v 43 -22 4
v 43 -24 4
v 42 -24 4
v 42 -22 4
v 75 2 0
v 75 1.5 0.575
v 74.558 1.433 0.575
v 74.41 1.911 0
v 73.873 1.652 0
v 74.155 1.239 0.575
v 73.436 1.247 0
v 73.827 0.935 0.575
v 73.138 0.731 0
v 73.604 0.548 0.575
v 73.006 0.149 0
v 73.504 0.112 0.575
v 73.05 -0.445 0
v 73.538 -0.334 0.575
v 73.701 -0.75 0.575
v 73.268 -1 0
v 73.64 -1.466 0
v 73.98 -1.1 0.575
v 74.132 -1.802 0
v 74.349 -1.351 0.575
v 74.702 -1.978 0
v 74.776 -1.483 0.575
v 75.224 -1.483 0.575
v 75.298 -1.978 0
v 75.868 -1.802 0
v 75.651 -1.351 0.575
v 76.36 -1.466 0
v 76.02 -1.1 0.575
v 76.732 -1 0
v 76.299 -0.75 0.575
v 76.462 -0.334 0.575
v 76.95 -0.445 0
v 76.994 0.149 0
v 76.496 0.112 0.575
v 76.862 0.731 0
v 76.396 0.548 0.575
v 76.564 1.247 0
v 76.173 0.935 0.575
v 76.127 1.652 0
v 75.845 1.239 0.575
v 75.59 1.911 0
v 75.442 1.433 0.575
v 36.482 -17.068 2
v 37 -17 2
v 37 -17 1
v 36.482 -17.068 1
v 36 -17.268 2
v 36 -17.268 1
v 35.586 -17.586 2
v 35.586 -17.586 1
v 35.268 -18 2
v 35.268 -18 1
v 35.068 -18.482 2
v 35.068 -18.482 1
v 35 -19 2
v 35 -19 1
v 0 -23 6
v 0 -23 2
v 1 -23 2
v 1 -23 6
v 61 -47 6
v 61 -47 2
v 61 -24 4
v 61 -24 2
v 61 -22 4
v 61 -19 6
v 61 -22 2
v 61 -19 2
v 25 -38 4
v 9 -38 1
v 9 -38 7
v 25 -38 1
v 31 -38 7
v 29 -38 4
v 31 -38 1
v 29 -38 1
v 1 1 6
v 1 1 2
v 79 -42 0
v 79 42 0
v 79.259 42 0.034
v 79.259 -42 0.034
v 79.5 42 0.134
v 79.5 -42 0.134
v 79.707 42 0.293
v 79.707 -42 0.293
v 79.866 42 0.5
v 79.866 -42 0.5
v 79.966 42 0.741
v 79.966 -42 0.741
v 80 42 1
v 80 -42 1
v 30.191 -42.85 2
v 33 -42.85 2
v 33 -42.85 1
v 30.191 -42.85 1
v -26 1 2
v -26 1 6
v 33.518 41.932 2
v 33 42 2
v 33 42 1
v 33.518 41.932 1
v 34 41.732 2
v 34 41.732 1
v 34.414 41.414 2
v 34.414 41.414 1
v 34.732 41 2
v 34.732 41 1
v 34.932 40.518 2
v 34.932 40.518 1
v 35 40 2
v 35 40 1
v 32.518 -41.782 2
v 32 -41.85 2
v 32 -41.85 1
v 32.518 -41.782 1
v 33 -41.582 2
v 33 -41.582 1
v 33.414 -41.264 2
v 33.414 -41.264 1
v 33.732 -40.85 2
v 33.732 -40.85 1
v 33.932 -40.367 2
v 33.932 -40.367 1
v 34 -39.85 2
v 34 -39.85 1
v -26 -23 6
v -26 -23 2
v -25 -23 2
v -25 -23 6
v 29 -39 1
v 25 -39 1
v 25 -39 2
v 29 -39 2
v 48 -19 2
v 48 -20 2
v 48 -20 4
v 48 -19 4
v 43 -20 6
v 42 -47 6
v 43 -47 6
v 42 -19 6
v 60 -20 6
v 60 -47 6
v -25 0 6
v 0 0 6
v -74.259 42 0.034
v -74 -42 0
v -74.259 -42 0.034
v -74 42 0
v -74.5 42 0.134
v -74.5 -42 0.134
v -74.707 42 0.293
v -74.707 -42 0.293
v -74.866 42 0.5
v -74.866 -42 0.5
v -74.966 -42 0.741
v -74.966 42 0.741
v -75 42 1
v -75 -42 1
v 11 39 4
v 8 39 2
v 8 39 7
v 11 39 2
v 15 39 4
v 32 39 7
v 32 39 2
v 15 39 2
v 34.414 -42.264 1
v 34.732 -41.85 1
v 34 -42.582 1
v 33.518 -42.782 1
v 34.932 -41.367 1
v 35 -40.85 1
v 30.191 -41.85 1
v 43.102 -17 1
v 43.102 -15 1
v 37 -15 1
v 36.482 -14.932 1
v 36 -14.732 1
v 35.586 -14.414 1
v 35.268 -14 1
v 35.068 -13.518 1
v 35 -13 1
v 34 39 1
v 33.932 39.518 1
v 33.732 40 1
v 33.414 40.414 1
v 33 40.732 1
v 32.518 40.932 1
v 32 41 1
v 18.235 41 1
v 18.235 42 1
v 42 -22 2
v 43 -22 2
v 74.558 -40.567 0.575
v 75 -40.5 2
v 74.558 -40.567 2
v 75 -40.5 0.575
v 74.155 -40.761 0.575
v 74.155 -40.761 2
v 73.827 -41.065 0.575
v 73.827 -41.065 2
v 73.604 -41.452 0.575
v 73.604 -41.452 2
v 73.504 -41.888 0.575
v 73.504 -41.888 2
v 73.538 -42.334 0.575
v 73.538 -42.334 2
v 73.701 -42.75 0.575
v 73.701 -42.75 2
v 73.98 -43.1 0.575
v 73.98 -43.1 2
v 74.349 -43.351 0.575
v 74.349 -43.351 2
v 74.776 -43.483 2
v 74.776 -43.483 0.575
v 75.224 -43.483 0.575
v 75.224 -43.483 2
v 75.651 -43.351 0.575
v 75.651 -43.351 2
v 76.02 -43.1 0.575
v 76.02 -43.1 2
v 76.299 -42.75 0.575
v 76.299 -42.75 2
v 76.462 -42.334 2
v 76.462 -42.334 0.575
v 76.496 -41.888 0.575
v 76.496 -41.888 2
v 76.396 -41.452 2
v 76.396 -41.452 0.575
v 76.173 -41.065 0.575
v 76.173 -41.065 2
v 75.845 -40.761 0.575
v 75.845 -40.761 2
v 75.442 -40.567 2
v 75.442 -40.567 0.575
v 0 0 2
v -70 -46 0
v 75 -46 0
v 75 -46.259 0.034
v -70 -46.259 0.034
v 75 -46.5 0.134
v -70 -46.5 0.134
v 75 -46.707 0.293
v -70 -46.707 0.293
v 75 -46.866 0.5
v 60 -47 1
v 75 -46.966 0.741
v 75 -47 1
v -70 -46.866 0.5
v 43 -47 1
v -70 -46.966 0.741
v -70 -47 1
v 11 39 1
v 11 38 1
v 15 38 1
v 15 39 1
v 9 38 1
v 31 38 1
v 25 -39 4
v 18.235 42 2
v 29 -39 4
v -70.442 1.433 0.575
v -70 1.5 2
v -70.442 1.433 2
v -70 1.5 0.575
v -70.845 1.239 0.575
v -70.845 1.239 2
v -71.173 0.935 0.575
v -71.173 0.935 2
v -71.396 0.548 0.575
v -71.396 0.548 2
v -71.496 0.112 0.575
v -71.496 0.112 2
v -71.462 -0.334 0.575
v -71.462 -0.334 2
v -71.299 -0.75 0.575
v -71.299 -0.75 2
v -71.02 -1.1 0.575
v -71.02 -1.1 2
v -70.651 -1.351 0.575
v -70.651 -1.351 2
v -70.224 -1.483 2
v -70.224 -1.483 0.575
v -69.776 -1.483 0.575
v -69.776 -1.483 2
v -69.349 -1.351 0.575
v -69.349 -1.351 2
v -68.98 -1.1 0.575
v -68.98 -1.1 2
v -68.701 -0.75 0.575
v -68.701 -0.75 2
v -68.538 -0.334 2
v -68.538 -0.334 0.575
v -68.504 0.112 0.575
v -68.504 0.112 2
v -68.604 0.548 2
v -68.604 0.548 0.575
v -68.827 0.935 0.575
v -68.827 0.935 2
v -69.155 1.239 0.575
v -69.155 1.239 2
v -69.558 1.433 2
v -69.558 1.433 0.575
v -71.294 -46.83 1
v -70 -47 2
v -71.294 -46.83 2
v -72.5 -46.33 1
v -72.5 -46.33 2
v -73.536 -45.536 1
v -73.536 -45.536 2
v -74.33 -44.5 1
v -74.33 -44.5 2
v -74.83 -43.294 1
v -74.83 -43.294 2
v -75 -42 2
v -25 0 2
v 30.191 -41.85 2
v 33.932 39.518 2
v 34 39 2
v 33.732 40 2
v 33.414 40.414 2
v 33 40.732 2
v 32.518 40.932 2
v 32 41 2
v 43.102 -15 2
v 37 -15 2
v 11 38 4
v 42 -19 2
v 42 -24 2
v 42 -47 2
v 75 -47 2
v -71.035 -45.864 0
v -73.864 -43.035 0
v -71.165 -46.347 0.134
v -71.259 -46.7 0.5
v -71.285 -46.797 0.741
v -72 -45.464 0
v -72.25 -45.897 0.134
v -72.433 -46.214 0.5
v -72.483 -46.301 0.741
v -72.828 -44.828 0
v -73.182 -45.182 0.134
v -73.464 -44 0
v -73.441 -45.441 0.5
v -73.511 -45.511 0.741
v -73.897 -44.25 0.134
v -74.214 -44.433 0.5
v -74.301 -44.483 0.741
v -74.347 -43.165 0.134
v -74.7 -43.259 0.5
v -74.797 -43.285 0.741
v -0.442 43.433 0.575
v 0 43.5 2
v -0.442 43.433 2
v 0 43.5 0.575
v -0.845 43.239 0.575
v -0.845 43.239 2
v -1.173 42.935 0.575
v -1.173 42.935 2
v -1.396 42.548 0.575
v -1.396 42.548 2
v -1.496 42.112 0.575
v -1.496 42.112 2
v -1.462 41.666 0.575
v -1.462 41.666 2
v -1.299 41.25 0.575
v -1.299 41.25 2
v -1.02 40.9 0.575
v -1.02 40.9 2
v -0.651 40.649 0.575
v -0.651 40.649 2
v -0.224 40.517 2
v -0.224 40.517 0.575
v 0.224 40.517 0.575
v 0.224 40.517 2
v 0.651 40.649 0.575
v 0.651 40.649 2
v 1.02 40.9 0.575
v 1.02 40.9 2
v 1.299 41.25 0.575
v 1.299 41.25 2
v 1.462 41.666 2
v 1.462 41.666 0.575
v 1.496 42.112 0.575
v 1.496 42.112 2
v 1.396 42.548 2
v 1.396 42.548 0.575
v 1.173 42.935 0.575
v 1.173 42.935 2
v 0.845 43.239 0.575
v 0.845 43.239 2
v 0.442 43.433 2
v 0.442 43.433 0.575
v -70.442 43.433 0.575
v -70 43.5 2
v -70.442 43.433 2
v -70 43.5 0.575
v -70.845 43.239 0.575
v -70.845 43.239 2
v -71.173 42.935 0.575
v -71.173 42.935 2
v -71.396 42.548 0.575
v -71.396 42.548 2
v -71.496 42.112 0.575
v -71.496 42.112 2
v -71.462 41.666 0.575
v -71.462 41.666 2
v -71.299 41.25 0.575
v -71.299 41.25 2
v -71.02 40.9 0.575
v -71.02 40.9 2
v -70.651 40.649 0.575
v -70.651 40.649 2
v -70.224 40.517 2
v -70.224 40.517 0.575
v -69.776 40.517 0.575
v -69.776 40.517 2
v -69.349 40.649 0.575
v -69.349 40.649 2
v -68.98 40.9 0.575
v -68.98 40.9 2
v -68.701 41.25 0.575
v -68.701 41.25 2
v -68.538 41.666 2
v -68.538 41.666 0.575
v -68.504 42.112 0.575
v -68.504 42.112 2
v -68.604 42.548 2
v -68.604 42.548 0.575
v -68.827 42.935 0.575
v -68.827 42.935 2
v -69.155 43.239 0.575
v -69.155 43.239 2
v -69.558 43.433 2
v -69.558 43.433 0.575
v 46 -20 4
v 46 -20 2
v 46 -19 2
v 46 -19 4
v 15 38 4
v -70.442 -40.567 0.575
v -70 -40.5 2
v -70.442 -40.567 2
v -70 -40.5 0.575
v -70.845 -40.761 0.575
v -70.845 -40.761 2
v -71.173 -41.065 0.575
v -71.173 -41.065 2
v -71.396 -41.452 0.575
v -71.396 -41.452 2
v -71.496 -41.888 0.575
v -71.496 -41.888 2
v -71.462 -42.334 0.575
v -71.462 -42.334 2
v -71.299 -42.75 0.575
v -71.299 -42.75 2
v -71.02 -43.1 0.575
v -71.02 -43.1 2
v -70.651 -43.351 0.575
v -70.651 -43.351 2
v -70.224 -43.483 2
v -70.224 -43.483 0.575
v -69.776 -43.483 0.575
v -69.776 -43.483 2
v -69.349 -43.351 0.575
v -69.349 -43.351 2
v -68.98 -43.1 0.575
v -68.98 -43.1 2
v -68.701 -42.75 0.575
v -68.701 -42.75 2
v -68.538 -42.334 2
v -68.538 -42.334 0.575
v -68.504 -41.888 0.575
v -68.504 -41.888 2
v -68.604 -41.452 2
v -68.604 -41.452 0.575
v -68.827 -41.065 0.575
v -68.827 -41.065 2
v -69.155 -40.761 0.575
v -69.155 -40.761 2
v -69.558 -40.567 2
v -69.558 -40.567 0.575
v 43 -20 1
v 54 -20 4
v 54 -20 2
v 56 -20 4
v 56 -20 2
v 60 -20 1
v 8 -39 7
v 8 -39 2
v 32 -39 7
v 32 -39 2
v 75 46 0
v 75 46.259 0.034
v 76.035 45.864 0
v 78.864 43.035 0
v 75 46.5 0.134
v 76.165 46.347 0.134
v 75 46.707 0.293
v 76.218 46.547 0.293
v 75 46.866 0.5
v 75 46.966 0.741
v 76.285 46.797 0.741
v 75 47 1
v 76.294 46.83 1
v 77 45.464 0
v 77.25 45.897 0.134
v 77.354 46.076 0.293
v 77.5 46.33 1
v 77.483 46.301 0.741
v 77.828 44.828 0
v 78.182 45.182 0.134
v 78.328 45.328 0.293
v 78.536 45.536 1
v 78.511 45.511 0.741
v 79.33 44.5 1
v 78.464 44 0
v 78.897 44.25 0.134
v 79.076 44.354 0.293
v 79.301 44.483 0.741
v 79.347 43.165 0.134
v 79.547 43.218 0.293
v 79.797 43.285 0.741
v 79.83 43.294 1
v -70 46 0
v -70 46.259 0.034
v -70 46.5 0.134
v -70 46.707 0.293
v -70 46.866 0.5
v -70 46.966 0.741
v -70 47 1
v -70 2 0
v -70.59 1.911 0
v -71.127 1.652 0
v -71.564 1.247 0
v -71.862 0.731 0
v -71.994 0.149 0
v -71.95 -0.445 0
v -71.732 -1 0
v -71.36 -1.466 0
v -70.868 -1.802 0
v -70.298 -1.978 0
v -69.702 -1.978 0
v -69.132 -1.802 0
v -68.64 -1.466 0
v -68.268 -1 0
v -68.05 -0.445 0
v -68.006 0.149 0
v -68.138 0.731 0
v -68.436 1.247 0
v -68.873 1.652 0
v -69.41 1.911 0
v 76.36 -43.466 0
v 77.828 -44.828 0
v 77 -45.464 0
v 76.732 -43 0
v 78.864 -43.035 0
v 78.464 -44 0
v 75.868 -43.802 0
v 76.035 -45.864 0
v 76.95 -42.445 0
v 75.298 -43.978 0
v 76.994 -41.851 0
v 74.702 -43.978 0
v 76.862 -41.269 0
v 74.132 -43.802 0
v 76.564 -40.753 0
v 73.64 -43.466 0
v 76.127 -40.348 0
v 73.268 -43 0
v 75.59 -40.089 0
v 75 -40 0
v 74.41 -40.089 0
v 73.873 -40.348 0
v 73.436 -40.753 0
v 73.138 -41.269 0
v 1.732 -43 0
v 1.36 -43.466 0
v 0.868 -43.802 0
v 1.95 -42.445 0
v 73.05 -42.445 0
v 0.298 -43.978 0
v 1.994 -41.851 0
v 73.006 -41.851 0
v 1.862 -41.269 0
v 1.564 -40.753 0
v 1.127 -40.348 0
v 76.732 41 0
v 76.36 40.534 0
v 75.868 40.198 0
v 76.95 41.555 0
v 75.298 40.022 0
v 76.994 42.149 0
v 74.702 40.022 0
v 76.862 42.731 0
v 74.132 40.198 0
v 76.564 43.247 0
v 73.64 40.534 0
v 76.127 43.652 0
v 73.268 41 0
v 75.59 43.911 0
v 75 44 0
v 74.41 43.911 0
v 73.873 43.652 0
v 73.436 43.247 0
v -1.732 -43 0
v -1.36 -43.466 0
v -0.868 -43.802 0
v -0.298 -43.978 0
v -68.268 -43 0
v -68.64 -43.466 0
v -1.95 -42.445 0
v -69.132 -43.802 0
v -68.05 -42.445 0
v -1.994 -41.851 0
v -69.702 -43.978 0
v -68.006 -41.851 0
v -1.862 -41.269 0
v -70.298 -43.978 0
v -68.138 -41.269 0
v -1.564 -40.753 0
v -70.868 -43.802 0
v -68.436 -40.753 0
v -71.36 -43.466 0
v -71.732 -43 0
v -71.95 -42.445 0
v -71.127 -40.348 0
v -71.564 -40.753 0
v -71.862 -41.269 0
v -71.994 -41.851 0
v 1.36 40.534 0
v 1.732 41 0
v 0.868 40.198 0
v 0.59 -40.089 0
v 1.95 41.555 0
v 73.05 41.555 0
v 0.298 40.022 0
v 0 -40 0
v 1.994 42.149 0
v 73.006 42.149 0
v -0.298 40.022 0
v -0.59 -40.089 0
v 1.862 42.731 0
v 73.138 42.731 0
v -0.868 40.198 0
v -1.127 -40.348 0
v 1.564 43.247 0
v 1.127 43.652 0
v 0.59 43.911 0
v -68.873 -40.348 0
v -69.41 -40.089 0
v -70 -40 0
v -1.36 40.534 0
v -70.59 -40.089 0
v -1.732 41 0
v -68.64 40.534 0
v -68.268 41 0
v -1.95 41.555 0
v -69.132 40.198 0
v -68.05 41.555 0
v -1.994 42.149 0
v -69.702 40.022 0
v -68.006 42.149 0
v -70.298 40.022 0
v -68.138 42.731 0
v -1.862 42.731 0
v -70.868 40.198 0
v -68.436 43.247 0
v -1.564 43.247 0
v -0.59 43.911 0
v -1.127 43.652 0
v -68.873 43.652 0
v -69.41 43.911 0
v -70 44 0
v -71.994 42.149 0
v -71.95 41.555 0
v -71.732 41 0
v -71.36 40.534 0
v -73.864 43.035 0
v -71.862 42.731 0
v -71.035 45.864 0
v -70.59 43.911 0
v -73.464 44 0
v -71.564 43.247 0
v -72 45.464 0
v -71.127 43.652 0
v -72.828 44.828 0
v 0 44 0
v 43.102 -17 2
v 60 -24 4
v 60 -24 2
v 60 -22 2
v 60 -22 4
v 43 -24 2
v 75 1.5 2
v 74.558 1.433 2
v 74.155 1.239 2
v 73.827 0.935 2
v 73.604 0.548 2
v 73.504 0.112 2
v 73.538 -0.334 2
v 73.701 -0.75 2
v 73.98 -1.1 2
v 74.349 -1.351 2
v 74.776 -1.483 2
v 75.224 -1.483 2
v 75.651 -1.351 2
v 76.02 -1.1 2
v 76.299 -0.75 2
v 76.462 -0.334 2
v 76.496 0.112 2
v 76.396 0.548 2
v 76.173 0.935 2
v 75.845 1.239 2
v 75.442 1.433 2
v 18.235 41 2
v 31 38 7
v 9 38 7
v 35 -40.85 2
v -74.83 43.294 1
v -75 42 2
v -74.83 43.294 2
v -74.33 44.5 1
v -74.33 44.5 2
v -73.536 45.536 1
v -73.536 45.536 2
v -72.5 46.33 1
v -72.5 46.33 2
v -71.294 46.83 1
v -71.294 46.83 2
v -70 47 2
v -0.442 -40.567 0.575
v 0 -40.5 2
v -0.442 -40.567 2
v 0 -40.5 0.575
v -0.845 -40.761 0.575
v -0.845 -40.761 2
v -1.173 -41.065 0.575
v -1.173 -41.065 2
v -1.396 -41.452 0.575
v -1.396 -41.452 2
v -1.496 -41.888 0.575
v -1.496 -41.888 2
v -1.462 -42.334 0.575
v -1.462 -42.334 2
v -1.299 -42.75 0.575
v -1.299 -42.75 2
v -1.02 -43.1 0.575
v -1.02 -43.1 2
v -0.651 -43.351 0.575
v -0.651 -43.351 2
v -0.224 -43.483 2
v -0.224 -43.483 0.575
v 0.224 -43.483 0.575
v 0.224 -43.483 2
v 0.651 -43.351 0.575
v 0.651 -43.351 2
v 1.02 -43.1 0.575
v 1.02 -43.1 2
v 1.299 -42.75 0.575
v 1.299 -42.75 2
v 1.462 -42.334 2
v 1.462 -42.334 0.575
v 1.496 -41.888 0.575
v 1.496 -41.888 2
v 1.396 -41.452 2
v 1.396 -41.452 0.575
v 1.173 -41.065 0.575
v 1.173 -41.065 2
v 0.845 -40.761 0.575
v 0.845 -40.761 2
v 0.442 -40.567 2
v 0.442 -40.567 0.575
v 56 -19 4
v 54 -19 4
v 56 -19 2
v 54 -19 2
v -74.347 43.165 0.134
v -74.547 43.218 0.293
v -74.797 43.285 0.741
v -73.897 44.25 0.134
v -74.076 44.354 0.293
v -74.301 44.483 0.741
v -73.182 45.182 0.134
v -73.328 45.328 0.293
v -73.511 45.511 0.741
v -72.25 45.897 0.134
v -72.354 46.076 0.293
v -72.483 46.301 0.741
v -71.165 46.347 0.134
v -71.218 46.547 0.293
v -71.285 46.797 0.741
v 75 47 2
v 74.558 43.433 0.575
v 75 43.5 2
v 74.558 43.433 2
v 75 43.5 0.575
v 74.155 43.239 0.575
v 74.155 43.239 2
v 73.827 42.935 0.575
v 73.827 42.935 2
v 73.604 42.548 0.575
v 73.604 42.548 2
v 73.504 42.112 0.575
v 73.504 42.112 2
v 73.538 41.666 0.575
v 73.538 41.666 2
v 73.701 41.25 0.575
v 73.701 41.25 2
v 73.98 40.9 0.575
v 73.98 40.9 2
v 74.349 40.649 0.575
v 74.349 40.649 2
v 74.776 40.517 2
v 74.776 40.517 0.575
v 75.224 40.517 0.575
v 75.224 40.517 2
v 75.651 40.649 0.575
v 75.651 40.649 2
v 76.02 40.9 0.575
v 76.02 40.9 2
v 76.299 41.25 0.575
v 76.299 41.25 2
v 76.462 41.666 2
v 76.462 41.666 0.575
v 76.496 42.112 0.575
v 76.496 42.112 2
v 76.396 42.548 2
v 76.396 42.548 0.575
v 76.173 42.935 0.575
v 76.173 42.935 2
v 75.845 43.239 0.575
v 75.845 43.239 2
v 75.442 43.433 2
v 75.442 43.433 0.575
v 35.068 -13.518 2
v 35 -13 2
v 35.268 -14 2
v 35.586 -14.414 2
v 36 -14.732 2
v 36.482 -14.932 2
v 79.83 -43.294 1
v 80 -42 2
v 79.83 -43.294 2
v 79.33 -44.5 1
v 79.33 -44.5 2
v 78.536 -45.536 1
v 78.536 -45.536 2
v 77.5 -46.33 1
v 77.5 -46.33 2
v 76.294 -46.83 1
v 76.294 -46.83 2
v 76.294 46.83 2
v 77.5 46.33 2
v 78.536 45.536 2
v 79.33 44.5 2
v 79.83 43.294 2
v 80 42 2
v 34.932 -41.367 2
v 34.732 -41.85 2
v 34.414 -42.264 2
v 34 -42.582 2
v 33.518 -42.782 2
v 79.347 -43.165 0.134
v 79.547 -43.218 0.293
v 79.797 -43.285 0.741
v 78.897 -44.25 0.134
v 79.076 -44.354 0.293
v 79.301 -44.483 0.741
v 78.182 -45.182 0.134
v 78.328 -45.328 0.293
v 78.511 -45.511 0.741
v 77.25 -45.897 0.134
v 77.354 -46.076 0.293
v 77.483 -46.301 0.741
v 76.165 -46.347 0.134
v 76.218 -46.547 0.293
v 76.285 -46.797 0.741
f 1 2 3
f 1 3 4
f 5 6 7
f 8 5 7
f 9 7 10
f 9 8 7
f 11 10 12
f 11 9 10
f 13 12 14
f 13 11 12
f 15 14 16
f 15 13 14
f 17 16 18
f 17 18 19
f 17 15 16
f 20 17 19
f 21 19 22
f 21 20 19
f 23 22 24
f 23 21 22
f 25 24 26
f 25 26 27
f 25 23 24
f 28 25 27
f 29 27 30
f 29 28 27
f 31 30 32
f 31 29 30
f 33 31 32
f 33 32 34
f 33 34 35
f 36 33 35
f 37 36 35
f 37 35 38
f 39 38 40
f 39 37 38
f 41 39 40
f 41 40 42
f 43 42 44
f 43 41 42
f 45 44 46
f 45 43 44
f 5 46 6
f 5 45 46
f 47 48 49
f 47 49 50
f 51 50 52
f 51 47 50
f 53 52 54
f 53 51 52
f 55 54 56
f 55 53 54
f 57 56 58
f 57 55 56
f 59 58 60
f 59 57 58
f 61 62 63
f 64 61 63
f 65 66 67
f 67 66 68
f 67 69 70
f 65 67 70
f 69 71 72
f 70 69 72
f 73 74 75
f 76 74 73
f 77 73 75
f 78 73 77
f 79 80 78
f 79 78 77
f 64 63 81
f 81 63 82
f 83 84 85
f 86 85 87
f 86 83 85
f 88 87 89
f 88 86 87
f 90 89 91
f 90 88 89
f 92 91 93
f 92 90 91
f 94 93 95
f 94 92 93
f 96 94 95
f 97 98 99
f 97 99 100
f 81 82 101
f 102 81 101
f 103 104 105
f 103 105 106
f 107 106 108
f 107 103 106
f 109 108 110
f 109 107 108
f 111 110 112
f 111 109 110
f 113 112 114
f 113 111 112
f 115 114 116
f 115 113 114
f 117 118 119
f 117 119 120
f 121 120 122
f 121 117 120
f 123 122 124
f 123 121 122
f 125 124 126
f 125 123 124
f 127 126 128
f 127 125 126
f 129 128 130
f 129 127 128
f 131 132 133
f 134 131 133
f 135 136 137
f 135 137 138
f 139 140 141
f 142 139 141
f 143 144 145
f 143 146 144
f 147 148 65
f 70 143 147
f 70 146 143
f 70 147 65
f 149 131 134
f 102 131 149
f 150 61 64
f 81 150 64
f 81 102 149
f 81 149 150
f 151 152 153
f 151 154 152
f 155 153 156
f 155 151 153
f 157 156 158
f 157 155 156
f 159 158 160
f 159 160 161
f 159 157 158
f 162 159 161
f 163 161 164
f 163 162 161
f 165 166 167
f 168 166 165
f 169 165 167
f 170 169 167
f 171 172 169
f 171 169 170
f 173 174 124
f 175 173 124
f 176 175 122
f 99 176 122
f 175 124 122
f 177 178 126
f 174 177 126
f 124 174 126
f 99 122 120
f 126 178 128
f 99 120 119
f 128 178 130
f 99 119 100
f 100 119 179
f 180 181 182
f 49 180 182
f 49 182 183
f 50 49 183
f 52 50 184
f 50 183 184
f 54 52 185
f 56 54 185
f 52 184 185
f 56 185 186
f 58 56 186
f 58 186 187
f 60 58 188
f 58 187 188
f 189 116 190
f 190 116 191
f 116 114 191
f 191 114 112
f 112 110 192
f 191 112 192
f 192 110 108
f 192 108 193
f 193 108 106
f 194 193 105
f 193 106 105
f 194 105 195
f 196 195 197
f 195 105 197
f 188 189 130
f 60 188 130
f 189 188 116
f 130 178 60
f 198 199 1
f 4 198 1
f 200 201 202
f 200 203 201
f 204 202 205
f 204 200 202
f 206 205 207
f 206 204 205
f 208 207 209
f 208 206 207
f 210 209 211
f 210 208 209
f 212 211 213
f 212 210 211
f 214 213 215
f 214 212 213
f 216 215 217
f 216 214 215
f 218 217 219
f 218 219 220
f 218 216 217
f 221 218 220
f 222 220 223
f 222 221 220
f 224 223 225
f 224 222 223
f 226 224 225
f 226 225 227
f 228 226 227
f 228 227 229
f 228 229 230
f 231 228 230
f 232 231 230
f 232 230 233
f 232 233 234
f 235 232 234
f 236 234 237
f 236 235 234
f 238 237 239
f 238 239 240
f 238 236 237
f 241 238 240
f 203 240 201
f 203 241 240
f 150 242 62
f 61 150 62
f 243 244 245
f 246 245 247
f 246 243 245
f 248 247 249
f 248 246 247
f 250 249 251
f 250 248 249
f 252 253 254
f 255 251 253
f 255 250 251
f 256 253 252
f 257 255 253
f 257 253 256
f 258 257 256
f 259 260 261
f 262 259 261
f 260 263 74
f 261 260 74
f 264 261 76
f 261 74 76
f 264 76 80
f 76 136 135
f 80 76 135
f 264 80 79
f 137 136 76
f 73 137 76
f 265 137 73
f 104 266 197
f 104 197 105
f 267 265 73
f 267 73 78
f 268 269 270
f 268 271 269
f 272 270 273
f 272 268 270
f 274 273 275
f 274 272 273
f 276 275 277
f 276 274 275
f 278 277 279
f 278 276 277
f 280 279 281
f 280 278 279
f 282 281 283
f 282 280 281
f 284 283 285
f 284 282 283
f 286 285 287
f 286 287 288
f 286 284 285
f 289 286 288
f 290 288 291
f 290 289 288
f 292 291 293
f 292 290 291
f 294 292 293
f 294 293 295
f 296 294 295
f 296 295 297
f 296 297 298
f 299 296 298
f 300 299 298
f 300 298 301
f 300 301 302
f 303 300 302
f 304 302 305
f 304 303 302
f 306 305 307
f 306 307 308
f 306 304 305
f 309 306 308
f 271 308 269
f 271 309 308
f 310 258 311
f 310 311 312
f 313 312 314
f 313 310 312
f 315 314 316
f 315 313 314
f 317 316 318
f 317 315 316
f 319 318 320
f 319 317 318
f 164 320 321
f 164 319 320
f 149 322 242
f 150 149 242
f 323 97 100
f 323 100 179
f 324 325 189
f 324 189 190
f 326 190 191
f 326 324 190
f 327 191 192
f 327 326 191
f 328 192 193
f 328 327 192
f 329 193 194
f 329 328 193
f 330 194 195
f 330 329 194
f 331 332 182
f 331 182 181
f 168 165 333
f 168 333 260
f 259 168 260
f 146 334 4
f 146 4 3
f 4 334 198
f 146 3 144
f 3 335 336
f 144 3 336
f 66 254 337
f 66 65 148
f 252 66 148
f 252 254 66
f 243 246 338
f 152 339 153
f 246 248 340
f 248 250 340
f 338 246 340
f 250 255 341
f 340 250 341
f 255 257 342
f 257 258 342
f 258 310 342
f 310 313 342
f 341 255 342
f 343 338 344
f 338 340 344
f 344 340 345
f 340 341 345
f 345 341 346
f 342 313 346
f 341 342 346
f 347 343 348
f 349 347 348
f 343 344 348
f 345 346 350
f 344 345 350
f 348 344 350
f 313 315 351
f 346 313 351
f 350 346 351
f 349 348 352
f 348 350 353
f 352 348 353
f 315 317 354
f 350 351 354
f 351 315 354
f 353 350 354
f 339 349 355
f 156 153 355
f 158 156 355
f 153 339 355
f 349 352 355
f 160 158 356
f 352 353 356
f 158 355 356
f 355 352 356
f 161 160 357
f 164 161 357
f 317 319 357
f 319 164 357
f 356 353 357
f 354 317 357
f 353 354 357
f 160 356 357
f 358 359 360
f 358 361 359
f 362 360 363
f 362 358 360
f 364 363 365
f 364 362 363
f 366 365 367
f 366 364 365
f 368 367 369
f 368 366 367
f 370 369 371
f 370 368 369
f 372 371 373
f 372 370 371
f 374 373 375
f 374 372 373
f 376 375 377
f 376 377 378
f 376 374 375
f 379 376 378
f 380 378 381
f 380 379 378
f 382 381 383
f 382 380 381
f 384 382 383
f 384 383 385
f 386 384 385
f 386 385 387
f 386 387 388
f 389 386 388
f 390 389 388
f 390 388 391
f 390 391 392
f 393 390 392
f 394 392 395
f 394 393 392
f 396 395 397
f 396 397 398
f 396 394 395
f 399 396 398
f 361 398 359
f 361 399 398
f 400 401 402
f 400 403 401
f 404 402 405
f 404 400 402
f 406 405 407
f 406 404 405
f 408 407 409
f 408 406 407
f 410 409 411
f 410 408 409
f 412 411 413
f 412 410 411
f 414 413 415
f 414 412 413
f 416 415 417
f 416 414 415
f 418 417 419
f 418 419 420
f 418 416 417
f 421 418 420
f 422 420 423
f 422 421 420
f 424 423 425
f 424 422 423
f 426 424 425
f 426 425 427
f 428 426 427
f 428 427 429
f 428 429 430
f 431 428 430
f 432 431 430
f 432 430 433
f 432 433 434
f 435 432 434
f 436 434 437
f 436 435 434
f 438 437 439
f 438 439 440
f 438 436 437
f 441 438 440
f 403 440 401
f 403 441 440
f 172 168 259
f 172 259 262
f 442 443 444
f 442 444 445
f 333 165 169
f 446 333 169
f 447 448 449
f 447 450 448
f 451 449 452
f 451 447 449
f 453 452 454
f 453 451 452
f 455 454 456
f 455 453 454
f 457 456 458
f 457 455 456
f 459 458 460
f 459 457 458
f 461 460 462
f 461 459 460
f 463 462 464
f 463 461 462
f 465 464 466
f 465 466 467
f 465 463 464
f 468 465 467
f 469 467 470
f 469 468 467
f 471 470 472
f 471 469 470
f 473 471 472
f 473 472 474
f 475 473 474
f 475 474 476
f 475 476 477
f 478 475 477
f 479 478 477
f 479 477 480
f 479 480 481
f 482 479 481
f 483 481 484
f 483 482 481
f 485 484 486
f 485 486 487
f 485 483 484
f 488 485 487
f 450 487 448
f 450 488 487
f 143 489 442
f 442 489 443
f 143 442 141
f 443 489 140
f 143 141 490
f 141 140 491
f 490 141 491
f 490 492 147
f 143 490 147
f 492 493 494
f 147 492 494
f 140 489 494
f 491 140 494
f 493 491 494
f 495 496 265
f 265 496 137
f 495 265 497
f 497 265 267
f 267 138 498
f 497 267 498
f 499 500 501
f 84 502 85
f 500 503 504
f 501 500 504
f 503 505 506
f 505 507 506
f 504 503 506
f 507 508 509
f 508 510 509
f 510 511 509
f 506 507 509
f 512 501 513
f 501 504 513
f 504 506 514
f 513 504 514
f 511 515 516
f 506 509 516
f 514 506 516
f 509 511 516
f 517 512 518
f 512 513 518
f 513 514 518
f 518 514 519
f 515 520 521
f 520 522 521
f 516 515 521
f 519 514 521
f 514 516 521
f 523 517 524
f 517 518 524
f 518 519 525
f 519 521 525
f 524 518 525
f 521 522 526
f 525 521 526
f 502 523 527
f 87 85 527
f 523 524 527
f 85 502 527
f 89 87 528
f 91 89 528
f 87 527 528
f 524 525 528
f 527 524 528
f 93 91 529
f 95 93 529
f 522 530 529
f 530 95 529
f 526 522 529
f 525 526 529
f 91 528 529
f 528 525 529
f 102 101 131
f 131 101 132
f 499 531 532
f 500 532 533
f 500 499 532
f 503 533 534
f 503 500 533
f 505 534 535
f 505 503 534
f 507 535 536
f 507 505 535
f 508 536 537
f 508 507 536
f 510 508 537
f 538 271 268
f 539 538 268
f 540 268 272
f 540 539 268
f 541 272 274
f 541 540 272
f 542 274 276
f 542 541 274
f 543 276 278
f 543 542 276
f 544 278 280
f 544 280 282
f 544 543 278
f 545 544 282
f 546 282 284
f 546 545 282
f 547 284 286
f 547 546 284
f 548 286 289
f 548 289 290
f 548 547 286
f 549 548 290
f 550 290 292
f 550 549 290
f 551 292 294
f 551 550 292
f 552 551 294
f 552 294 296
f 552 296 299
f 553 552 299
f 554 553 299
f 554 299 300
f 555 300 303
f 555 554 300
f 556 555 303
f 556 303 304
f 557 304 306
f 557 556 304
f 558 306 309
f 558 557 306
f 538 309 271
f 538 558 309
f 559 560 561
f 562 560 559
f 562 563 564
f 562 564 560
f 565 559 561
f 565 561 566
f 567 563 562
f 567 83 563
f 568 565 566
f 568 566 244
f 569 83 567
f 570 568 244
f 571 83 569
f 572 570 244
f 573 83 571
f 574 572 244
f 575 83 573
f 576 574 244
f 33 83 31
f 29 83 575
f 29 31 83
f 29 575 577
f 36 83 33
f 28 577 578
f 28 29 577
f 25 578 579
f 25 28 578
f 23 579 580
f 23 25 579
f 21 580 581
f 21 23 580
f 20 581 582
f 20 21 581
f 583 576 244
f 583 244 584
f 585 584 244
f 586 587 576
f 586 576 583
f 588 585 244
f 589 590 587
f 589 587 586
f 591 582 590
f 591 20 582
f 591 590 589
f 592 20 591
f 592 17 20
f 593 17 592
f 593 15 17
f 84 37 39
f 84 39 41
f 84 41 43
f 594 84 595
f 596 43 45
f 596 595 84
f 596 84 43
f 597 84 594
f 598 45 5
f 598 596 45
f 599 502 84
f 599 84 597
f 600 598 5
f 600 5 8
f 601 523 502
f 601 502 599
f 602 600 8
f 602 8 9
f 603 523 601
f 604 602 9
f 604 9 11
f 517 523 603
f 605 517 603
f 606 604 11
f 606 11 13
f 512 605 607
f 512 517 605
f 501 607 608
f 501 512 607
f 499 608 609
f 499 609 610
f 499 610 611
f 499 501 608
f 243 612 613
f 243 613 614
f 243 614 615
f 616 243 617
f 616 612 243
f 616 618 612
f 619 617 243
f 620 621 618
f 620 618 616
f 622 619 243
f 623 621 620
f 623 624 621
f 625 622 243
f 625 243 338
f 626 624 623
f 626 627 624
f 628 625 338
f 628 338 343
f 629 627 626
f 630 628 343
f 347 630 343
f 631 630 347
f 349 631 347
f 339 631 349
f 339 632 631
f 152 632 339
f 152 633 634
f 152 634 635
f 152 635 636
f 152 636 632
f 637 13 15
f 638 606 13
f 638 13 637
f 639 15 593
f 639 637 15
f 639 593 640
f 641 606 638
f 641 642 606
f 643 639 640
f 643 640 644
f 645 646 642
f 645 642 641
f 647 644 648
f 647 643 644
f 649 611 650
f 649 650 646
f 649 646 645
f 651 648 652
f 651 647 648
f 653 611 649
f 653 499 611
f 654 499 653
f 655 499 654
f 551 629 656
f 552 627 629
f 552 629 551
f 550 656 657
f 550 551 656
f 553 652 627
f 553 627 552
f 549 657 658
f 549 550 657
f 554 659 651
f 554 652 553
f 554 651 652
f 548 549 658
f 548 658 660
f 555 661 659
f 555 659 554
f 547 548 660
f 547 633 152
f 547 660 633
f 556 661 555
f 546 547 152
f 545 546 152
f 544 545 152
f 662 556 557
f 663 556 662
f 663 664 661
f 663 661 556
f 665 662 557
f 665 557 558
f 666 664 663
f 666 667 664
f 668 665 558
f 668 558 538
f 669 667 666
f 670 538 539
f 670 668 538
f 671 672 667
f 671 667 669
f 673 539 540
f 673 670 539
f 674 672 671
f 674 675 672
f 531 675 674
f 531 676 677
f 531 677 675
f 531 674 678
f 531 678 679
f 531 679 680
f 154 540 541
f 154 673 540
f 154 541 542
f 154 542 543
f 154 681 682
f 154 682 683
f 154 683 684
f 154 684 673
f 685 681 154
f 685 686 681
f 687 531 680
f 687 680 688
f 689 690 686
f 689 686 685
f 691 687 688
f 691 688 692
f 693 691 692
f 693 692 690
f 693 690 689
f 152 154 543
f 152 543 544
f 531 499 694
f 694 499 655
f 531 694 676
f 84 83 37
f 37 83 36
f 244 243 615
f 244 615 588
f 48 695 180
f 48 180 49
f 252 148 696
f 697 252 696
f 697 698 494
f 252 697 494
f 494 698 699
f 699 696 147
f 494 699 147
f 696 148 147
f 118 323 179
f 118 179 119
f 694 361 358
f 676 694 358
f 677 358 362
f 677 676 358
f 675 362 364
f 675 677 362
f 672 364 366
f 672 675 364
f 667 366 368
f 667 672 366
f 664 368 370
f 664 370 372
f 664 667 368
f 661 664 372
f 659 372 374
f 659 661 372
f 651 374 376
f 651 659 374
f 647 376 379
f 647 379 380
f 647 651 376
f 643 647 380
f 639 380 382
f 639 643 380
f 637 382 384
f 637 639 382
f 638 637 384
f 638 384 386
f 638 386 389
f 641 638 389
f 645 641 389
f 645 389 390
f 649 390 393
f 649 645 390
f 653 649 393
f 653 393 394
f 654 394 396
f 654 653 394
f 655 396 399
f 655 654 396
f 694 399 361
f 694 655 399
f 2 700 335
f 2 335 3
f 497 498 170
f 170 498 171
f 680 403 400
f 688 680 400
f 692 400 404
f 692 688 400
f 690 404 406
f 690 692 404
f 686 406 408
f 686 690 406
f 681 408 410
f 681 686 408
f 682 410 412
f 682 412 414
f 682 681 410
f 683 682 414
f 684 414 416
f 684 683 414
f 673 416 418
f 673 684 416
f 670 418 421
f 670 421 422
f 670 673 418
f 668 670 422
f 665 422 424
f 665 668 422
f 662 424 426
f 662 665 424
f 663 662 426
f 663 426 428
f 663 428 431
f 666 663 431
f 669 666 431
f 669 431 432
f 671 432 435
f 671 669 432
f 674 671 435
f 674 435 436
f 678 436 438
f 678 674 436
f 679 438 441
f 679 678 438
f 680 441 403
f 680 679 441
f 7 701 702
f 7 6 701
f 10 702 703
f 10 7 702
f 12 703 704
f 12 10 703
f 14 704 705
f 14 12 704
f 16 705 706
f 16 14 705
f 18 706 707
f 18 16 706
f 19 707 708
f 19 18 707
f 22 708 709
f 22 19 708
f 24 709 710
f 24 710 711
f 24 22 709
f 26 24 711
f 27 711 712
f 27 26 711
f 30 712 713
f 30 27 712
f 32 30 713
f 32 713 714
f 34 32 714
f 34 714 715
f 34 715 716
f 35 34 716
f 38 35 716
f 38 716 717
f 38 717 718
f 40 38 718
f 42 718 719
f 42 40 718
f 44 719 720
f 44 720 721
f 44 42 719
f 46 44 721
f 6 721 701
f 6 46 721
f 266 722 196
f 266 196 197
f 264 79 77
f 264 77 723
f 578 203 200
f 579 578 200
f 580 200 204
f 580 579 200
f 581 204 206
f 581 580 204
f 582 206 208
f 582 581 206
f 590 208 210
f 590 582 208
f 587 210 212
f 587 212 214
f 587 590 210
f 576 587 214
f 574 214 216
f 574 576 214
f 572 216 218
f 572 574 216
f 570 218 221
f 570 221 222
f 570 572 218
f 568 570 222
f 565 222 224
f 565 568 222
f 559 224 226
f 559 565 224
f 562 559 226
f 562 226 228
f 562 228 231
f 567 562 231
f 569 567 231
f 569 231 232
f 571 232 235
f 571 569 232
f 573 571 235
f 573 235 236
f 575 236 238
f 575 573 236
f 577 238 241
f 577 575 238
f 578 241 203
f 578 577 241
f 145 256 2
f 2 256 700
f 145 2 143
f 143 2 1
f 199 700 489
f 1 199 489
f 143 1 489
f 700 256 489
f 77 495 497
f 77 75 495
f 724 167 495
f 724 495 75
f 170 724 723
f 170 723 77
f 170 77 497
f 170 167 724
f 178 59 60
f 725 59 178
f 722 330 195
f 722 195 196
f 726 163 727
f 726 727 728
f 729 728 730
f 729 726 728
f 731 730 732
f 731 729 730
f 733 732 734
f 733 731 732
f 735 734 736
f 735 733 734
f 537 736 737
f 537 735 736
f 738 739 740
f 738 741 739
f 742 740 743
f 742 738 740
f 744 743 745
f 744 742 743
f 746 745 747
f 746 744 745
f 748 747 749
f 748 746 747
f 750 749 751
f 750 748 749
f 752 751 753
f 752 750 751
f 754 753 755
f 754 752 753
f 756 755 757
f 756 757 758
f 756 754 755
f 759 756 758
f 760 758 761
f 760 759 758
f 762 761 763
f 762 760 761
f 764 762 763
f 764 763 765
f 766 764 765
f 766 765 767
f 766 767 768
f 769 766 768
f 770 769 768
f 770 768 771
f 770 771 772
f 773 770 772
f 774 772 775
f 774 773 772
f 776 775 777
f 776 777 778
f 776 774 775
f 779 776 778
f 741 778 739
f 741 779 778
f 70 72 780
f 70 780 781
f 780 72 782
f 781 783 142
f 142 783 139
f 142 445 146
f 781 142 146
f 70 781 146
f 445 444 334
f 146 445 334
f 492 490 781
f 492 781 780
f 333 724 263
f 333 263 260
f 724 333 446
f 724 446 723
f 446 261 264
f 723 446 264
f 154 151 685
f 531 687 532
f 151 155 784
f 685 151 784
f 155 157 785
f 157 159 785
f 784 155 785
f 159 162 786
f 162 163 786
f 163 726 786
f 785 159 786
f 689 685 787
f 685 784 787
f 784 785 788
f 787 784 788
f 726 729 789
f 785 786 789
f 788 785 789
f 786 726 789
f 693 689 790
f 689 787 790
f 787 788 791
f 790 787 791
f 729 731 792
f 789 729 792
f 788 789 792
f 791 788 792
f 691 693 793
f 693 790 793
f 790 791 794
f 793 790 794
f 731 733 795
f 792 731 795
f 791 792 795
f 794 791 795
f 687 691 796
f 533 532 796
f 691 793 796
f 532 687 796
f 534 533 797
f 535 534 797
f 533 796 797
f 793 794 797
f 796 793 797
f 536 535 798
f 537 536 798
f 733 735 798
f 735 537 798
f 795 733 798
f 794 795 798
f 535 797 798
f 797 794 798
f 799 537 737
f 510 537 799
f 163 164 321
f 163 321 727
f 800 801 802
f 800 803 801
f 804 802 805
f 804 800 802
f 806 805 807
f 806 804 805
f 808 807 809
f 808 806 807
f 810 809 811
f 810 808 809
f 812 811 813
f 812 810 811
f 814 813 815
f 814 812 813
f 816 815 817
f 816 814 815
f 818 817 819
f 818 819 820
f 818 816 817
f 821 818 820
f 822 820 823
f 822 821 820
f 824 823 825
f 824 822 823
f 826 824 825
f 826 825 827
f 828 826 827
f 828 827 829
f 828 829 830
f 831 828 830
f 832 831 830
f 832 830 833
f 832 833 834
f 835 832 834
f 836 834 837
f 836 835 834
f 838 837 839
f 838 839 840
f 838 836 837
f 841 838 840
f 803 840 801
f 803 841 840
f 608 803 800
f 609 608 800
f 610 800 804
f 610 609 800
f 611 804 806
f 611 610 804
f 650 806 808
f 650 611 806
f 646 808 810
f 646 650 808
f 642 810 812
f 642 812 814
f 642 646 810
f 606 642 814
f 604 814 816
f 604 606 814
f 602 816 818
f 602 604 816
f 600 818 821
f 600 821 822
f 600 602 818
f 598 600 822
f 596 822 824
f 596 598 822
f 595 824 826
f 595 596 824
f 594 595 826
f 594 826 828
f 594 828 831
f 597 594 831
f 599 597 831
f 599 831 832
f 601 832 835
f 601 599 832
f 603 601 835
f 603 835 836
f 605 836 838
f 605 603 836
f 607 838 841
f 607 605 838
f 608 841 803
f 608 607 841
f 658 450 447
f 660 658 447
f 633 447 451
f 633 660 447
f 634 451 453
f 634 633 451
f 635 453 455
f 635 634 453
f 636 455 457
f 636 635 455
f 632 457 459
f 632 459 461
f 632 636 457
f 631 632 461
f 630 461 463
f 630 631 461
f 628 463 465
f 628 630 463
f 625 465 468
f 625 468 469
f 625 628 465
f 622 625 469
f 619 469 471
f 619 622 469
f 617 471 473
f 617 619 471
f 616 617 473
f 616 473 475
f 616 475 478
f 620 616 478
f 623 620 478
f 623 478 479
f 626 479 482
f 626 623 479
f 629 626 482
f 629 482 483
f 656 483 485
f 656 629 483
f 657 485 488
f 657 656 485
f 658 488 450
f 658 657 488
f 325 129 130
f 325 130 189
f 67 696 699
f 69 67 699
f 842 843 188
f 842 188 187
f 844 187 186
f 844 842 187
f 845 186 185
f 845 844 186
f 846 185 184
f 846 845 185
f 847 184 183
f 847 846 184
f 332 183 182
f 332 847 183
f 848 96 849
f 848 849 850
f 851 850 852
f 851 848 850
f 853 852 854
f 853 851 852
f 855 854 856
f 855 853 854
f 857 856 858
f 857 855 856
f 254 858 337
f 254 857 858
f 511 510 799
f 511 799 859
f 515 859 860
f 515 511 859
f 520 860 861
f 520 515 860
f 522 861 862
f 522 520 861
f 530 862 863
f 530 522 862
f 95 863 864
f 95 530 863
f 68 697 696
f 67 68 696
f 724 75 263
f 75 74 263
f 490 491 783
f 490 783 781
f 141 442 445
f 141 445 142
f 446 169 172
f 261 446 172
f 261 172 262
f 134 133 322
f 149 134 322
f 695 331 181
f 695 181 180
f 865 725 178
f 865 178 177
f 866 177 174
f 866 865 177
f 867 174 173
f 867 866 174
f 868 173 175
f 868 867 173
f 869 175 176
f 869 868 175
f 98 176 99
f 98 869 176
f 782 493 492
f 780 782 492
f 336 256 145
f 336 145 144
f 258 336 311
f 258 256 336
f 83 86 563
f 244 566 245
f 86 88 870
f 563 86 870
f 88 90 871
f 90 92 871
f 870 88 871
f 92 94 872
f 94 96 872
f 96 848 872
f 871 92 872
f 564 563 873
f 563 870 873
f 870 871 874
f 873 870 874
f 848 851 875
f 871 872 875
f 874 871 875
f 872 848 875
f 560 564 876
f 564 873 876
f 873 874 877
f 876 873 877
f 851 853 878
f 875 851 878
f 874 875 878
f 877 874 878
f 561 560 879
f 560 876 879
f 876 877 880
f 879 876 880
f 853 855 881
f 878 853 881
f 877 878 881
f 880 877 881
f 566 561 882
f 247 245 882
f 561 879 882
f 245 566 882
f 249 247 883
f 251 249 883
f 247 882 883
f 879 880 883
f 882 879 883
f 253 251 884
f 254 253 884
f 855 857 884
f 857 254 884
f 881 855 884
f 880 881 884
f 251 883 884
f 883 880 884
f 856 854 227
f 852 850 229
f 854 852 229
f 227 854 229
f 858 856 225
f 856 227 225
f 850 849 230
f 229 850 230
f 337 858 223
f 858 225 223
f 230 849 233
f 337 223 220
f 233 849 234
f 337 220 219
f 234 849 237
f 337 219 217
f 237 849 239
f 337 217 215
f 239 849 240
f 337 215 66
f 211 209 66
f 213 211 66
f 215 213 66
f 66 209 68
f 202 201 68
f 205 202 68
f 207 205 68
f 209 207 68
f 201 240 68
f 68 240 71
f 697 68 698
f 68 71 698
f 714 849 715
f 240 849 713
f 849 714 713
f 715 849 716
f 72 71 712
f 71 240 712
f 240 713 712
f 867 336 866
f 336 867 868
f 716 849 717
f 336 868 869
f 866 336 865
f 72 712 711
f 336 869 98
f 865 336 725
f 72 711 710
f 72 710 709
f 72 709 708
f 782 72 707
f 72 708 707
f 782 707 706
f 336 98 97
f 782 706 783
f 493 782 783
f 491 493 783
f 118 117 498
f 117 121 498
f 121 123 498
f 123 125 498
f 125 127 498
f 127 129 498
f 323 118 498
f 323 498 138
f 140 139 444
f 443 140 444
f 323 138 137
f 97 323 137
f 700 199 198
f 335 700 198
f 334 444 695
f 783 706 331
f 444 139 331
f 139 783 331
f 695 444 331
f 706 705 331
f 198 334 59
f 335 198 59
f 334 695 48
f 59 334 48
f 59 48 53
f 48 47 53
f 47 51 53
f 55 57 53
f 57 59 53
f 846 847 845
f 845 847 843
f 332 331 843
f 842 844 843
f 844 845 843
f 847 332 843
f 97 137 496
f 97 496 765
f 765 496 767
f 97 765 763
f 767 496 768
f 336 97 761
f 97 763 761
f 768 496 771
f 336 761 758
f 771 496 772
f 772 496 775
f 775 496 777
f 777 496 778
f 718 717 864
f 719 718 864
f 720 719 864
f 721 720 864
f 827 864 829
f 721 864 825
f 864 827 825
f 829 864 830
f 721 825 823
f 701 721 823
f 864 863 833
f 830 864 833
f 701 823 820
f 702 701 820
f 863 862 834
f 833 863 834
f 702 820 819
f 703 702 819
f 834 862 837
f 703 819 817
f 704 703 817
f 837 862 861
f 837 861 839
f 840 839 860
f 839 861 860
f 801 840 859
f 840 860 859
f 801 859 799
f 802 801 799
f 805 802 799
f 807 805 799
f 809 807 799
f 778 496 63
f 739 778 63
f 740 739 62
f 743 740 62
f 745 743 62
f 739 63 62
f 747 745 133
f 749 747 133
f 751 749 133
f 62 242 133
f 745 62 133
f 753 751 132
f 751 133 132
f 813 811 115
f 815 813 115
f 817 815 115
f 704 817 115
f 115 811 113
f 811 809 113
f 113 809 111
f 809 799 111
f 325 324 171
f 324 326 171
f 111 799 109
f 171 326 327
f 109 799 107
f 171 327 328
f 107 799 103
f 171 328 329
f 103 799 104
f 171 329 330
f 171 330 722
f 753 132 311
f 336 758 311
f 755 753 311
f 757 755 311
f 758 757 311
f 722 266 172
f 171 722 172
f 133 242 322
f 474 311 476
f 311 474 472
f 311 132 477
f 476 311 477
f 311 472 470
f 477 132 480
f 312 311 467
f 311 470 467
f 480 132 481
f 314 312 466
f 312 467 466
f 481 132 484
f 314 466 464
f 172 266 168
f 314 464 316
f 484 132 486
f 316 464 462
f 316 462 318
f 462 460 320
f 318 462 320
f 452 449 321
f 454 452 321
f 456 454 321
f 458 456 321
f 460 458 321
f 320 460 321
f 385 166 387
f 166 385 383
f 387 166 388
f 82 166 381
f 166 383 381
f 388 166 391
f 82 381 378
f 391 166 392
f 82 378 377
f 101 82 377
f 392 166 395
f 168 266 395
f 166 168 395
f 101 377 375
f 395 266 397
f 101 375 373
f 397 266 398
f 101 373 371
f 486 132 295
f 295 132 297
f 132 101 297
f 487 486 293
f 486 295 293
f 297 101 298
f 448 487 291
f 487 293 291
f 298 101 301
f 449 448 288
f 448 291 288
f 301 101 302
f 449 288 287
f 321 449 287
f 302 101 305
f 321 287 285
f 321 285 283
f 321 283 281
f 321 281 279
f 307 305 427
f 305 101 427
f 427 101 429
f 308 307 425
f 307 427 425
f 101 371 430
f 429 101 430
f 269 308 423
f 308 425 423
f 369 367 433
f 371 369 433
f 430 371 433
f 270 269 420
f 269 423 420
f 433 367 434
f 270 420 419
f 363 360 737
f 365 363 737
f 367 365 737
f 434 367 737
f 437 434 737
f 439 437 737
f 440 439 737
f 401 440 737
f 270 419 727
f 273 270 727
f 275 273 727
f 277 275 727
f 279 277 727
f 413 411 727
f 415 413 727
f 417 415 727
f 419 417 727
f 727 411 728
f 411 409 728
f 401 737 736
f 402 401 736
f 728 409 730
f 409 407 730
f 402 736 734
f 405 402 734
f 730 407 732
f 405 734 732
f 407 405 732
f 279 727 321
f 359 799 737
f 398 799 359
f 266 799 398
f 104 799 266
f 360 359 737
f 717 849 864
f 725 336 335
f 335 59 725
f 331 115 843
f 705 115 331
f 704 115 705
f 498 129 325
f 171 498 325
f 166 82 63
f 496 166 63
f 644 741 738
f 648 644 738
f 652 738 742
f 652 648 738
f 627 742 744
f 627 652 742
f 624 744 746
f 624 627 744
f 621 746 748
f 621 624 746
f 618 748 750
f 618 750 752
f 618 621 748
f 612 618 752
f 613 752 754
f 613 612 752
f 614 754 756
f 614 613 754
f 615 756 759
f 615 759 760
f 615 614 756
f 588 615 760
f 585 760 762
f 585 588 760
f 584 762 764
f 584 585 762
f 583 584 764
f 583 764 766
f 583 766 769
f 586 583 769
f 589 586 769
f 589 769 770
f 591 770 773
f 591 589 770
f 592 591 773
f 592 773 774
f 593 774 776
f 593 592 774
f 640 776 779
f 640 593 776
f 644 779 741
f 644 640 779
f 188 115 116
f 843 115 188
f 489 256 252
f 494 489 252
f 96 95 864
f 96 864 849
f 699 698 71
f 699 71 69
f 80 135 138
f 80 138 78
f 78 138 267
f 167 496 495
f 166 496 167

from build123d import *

# Parameters (mm, degrees)
BOSS_EXTRUDE1_DEPTH                           = 2
CSK_FOR_0_FLAT_HEAD_MACHINE_SCREW1_AT_2_COUNT = 2
CSK_FOR_0_FLAT_HEAD_MACHINE_SCREW1_AT_2_PITCH = 42
CSK_FOR_0_FLAT_HEAD_MACHINE_SCREW1_AT_3_COUNT = 2
CSK_FOR_0_FLAT_HEAD_MACHINE_SCREW1_AT_3_PITCH = 84
CSK_FOR_0_FLAT_HEAD_MACHINE_SCREW1_AT_4_COUNT = 2
CSK_FOR_0_FLAT_HEAD_MACHINE_SCREW1_AT_4_PITCH = 112.609946275
CSK_FOR_0_FLAT_HEAD_MACHINE_SCREW1_AT_5_COUNT = 2
CSK_FOR_0_FLAT_HEAD_MACHINE_SCREW1_AT_5_PITCH = 167.573864311
CSK_FOR_0_FLAT_HEAD_MACHINE_SCREW1_AT_6_COUNT = 2
CSK_FOR_0_FLAT_HEAD_MACHINE_SCREW1_AT_6_PITCH = 150.960259671
CSK_FOR_0_FLAT_HEAD_MACHINE_SCREW1_AT_7_COUNT = 2
CSK_FOR_0_FLAT_HEAD_MACHINE_SCREW1_AT_7_PITCH = 145
CSK_FOR_0_FLAT_HEAD_MACHINE_SCREW1_AT_8_COUNT = 2
CSK_FOR_0_FLAT_HEAD_MACHINE_SCREW1_AT_8_PITCH = 75
FILLET1_R                                     = 1
SKETCH9_W                                     = 22
SKETCH9_H                                     = 76
CUT_EXTRUDE2_DEPTH                            = 1
SKETCH9_5_W                                   = 24
SKETCH9_5_H                                   = 78
SKETCH9_5_W_2                                 = 22
SKETCH9_5_H_2                                 = 76
BOSS_EXTRUDE4_DEPTH                           = 5
SKETCH11_W                                    = 4
SKETCH11_H                                    = 2
CUT_EXTRUDE4_DEPTH                            = 5
SKETCH13_W                                    = 4
SKETCH13_H                                    = 2
CUT_EXTRUDE5_DEPTH                            = 1
SKETCH14_W                                    = 4
SKETCH14_H                                    = 1
CUT_EXTRUDE6_DEPTH                            = 1
SKETCH15_W                                    = 4
SKETCH15_H                                    = 1
CUT_EXTRUDE7_DEPTH                            = 1
BOSS_EXTRUDE5_DEPTH                           = 4
SKETCH9_8_W                                   = 17
SKETCH9_8_H                                   = 27
CUT_EXTRUDE10_DEPTH                           = 1
SKETCH17_W                                    = 2
SKETCH17_H                                    = 2
CUT_EXTRUDE11_DEPTH                           = 1
CUT_EXTRUDE12_DEPTH                           = 21
CUT_EXTRUDE12_DEPTH_BACK                      = 1
SKETCH18_W                                    = 2
SKETCH18_H                                    = 2
CUT_EXTRUDE13_DEPTH                           = 1
BOSS_EXTRUDE6_DEPTH                           = 4


with BuildPart() as part:
    # Sketch1 → Boss-Extrude1 (new body)
    with BuildSketch(Plane.XY):
        with BuildLine():
            Line((-70, 47), (75, 47))
            ThreePointArc((75, 47), (78.535533906, 45.535533906), (80, 42))
            Line((80, 42), (80, -42))
            ThreePointArc((80, -42), (78.535533906, -45.535533906), (75, -47))
            Line((75, -47), (-70, -47))
            ThreePointArc((-70, -47), (-73.535533906, -45.535533906), (-75, -42))
            Line((-75, -42), (-75, 42))
            ThreePointArc((-75, 42), (-73.535533906, 45.535533906), (-70, 47))
        make_face()
    extrude(amount=BOSS_EXTRUDE1_DEPTH)

    # Sketch8 → CSK for #0 Flat Head Machine Screw1 (revolve, cut)
    with BuildSketch(Plane(origin=(75, 42, 0), x_dir=(0, 1, 0), z_dir=(1, 0, 0))):
        Polygon((0, 0), (0, 2), (1.500000048, 2), (1.500000048, 0.575184076), (1.999999937, 0), align=None)
    csk_for_0_flat_head_machine_screw1 = revolve(axis=Axis((75, 42, -6.35), (0, 0, 1)), mode=Mode.SUBTRACT)

    # CSK for #0 Flat Head Machine Screw1 at 2: CSK for #0 Flat Head Machine Screw1 ×2
    with Locations(*[(0, -i * CSK_FOR_0_FLAT_HEAD_MACHINE_SCREW1_AT_2_PITCH, 0) for i in range(1, CSK_FOR_0_FLAT_HEAD_MACHINE_SCREW1_AT_2_COUNT)]):
        add(csk_for_0_flat_head_machine_screw1, mode=Mode.SUBTRACT)

    # CSK for #0 Flat Head Machine Screw1 at 3: CSK for #0 Flat Head Machine Screw1 ×2
    with Locations(*[(0, -i * CSK_FOR_0_FLAT_HEAD_MACHINE_SCREW1_AT_3_PITCH, 0) for i in range(1, CSK_FOR_0_FLAT_HEAD_MACHINE_SCREW1_AT_3_COUNT)]):
        add(csk_for_0_flat_head_machine_screw1, mode=Mode.SUBTRACT)

    # CSK for #0 Flat Head Machine Screw1 at 4: CSK for #0 Flat Head Machine Screw1 ×2
    with Locations(*[Vector(-0.6660157693088523, -0.7459376616259147, 0) * (i * CSK_FOR_0_FLAT_HEAD_MACHINE_SCREW1_AT_4_PITCH) for i in range(1, CSK_FOR_0_FLAT_HEAD_MACHINE_SCREW1_AT_4_COUNT)]):
        add(csk_for_0_flat_head_machine_screw1, mode=Mode.SUBTRACT)

    # CSK for #0 Flat Head Machine Screw1 at 5: CSK for #0 Flat Head Machine Screw1 ×2
    with Locations(*[Vector(-0.8652900653481878, -0.5012714861327433, 0) * (i * CSK_FOR_0_FLAT_HEAD_MACHINE_SCREW1_AT_5_PITCH) for i in range(1, CSK_FOR_0_FLAT_HEAD_MACHINE_SCREW1_AT_5_COUNT)]):
        add(csk_for_0_flat_head_machine_screw1, mode=Mode.SUBTRACT)

    # CSK for #0 Flat Head Machine Screw1 at 6: CSK for #0 Flat Head Machine Screw1 ×2
    with Locations(*[Vector(-0.9605176906545201, -0.27821891729303344, 0) * (i * CSK_FOR_0_FLAT_HEAD_MACHINE_SCREW1_AT_6_PITCH) for i in range(1, CSK_FOR_0_FLAT_HEAD_MACHINE_SCREW1_AT_6_COUNT)]):
        add(csk_for_0_flat_head_machine_screw1, mode=Mode.SUBTRACT)

    # CSK for #0 Flat Head Machine Screw1 at 7: CSK for #0 Flat Head Machine Screw1 ×2
    with Locations(*[(-i * CSK_FOR_0_FLAT_HEAD_MACHINE_SCREW1_AT_7_PITCH, 0, 0) for i in range(1, CSK_FOR_0_FLAT_HEAD_MACHINE_SCREW1_AT_7_COUNT)]):
        add(csk_for_0_flat_head_machine_screw1, mode=Mode.SUBTRACT)

    # CSK for #0 Flat Head Machine Screw1 at 8: CSK for #0 Flat Head Machine Screw1 ×2
    with Locations(*[(-i * CSK_FOR_0_FLAT_HEAD_MACHINE_SCREW1_AT_8_PITCH, 0, 0) for i in range(1, CSK_FOR_0_FLAT_HEAD_MACHINE_SCREW1_AT_8_COUNT)]):
        add(csk_for_0_flat_head_machine_screw1, mode=Mode.SUBTRACT)

    # Fillet1
    fillet1_edges = [part.edges().sort_by_distance(p)[0] for p in [
        (78.535533906, 45.535533906, 0),
        (80, 0, 0),
        (78.535533906, -45.535533906, 0),
        (2.5, -47, 0),
        (-73.535533906, -45.535533906, 0),
        (-75, 0, 0),
        (-73.535533906, 45.535533906, 0),
        (2.5, 47, 0),
    ]]
    fillet(fillet1_edges, radius=FILLET1_R)

    # Sketch9 → Cut-Extrude2 (cut)
    with BuildSketch(Plane.XY.offset(2)):
        with Locations((20, 0)):
            Rectangle(SKETCH9_W, SKETCH9_H)
    extrude(amount=-CUT_EXTRUDE2_DEPTH, mode=Mode.SUBTRACT)

    # Sketch9<5> → Boss-Extrude4 (add)
    with BuildSketch(Plane.XY.offset(2)):
        with Locations((20, 0)):
            Rectangle(SKETCH9_5_W, SKETCH9_5_H)
        with Locations((20, 0)):
            Rectangle(SKETCH9_5_W_2, SKETCH9_5_H_2, mode=Mode.SUBTRACT)
    extrude(amount=BOSS_EXTRUDE4_DEPTH)

    # Sketch11 → Cut-Extrude4 (cut)
    with BuildSketch(Plane(origin=(0, 39, 0), x_dir=(1, 0, 0), z_dir=(0, 1, 0))):
        with Locations((13, -3)):
            Rectangle(SKETCH11_W, SKETCH11_H)
    extrude(amount=-CUT_EXTRUDE4_DEPTH, mode=Mode.SUBTRACT)

    # Sketch13 → Cut-Extrude5 (cut)
    with BuildSketch(Plane.XZ.offset(39)):
        with Locations((27, 3)):
            Rectangle(SKETCH13_W, SKETCH13_H)
    extrude(amount=-CUT_EXTRUDE5_DEPTH, mode=Mode.SUBTRACT)

    # Sketch14 → Cut-Extrude6 (cut)
    with BuildSketch(Plane.XZ.offset(-38)):
        with Locations((13, 1.5)):
            Rectangle(SKETCH14_W, SKETCH14_H)
    extrude(amount=-CUT_EXTRUDE6_DEPTH, mode=Mode.SUBTRACT)

    # Sketch15 → Cut-Extrude7 (cut)
    with BuildSketch(Plane(origin=(0, -38, 0), x_dir=(1, 0, 0), z_dir=(0, 1, 0))):
        with Locations((27, -1.5)):
            Rectangle(SKETCH15_W, SKETCH15_H)
    extrude(amount=-CUT_EXTRUDE7_DEPTH, mode=Mode.SUBTRACT)

    # Sketch9<7> → Boss-Extrude5 (add)
    with BuildSketch(Plane.XY.offset(2)):
        Polygon((42, -47), (43, -47), (43, -20), (60, -20), (60, -47), (61, -47), (61, -19), (42, -19), align=None)
    extrude(amount=BOSS_EXTRUDE5_DEPTH)

    # Sketch9<8> → Cut-Extrude10 (cut)
    with BuildSketch(Plane.XY.offset(2)):
        with Locations((51.5, -33.5)):
            Rectangle(SKETCH9_8_W, SKETCH9_8_H)
    extrude(amount=-CUT_EXTRUDE10_DEPTH, mode=Mode.SUBTRACT)

    # Sketch17 → Cut-Extrude11 (cut)
    with BuildSketch(Plane.XZ.offset(20)):
        with Locations((47, 3)):
            Rectangle(SKETCH17_W, SKETCH17_H)
        with Locations((55, 3)):
            Rectangle(SKETCH17_W, SKETCH17_H)
    extrude(amount=-CUT_EXTRUDE11_DEPTH, mode=Mode.SUBTRACT)

    # Sketch18 → Cut-Extrude12 (cut, two sides: drawn at the far end of the back side and taken through both)
    with BuildSketch(Plane.ZY.offset(-60).offset(-CUT_EXTRUDE12_DEPTH_BACK)):
        with Locations((3, -23)):
            Rectangle(SKETCH18_W, SKETCH18_H)
    extrude(amount=CUT_EXTRUDE12_DEPTH + CUT_EXTRUDE12_DEPTH_BACK, mode=Mode.SUBTRACT)

    # Sketch19 → Cut-Extrude13 (cut)
    with BuildSketch(Plane.XY.offset(2)):
        with BuildLine():
            Line((32, -41.849789893), (30.191318858, -41.849789893))
            Line((30.191318858, -41.849789893), (30.191318858, -42.849789893))
            Line((30.191318858, -42.849789893), (33, -42.849789893))
            ThreePointArc((33, -42.849789893), (34.414213562, -42.264003455), (35, -40.849789893))
            Line((35, -40.849789893), (35, -19))
            ThreePointArc((35, -19), (35.585786438, -17.585786438), (37, -17))
            Line((37, -17), (43.101704987, -17))
            Line((43.101704987, -17), (43.101704987, -16))
            Line((43.101704987, -16), (43.101704987, -15))
            Line((43.101704987, -15), (37, -15))
            ThreePointArc((37, -15), (35.585786438, -14.414213562), (35, -13))
            Line((35, -13), (35, 40))
            ThreePointArc((35, 40), (34.414213562, 41.414213562), (33, 42))
            Line((33, 42), (18.235350669, 42))
            Line((18.235350669, 42), (18.235350669, 41))
            Line((18.235350669, 41), (32, 41))
            ThreePointArc((32, 41), (33.414213562, 40.414213562), (34, 39))
            Line((34, 39), (34, -16))
            Line((34, -16), (34, -39.849789893))
            ThreePointArc((34, -39.849789893), (33.414213562, -41.264003455), (32, -41.849789893))
        make_face()
    extrude(amount=-CUT_EXTRUDE13_DEPTH, mode=Mode.SUBTRACT)

    # Sketch20 → Boss-Extrude6 (add)
    with BuildSketch(Plane.XY.offset(2)):
        Polygon((0, 0), (0, -23), (1, -23), (1, 1), (-26, 1), (-26, -23), (-25, -23), (-25, 0), align=None)
    extrude(amount=BOSS_EXTRUDE6_DEPTH)


solid = part.part
